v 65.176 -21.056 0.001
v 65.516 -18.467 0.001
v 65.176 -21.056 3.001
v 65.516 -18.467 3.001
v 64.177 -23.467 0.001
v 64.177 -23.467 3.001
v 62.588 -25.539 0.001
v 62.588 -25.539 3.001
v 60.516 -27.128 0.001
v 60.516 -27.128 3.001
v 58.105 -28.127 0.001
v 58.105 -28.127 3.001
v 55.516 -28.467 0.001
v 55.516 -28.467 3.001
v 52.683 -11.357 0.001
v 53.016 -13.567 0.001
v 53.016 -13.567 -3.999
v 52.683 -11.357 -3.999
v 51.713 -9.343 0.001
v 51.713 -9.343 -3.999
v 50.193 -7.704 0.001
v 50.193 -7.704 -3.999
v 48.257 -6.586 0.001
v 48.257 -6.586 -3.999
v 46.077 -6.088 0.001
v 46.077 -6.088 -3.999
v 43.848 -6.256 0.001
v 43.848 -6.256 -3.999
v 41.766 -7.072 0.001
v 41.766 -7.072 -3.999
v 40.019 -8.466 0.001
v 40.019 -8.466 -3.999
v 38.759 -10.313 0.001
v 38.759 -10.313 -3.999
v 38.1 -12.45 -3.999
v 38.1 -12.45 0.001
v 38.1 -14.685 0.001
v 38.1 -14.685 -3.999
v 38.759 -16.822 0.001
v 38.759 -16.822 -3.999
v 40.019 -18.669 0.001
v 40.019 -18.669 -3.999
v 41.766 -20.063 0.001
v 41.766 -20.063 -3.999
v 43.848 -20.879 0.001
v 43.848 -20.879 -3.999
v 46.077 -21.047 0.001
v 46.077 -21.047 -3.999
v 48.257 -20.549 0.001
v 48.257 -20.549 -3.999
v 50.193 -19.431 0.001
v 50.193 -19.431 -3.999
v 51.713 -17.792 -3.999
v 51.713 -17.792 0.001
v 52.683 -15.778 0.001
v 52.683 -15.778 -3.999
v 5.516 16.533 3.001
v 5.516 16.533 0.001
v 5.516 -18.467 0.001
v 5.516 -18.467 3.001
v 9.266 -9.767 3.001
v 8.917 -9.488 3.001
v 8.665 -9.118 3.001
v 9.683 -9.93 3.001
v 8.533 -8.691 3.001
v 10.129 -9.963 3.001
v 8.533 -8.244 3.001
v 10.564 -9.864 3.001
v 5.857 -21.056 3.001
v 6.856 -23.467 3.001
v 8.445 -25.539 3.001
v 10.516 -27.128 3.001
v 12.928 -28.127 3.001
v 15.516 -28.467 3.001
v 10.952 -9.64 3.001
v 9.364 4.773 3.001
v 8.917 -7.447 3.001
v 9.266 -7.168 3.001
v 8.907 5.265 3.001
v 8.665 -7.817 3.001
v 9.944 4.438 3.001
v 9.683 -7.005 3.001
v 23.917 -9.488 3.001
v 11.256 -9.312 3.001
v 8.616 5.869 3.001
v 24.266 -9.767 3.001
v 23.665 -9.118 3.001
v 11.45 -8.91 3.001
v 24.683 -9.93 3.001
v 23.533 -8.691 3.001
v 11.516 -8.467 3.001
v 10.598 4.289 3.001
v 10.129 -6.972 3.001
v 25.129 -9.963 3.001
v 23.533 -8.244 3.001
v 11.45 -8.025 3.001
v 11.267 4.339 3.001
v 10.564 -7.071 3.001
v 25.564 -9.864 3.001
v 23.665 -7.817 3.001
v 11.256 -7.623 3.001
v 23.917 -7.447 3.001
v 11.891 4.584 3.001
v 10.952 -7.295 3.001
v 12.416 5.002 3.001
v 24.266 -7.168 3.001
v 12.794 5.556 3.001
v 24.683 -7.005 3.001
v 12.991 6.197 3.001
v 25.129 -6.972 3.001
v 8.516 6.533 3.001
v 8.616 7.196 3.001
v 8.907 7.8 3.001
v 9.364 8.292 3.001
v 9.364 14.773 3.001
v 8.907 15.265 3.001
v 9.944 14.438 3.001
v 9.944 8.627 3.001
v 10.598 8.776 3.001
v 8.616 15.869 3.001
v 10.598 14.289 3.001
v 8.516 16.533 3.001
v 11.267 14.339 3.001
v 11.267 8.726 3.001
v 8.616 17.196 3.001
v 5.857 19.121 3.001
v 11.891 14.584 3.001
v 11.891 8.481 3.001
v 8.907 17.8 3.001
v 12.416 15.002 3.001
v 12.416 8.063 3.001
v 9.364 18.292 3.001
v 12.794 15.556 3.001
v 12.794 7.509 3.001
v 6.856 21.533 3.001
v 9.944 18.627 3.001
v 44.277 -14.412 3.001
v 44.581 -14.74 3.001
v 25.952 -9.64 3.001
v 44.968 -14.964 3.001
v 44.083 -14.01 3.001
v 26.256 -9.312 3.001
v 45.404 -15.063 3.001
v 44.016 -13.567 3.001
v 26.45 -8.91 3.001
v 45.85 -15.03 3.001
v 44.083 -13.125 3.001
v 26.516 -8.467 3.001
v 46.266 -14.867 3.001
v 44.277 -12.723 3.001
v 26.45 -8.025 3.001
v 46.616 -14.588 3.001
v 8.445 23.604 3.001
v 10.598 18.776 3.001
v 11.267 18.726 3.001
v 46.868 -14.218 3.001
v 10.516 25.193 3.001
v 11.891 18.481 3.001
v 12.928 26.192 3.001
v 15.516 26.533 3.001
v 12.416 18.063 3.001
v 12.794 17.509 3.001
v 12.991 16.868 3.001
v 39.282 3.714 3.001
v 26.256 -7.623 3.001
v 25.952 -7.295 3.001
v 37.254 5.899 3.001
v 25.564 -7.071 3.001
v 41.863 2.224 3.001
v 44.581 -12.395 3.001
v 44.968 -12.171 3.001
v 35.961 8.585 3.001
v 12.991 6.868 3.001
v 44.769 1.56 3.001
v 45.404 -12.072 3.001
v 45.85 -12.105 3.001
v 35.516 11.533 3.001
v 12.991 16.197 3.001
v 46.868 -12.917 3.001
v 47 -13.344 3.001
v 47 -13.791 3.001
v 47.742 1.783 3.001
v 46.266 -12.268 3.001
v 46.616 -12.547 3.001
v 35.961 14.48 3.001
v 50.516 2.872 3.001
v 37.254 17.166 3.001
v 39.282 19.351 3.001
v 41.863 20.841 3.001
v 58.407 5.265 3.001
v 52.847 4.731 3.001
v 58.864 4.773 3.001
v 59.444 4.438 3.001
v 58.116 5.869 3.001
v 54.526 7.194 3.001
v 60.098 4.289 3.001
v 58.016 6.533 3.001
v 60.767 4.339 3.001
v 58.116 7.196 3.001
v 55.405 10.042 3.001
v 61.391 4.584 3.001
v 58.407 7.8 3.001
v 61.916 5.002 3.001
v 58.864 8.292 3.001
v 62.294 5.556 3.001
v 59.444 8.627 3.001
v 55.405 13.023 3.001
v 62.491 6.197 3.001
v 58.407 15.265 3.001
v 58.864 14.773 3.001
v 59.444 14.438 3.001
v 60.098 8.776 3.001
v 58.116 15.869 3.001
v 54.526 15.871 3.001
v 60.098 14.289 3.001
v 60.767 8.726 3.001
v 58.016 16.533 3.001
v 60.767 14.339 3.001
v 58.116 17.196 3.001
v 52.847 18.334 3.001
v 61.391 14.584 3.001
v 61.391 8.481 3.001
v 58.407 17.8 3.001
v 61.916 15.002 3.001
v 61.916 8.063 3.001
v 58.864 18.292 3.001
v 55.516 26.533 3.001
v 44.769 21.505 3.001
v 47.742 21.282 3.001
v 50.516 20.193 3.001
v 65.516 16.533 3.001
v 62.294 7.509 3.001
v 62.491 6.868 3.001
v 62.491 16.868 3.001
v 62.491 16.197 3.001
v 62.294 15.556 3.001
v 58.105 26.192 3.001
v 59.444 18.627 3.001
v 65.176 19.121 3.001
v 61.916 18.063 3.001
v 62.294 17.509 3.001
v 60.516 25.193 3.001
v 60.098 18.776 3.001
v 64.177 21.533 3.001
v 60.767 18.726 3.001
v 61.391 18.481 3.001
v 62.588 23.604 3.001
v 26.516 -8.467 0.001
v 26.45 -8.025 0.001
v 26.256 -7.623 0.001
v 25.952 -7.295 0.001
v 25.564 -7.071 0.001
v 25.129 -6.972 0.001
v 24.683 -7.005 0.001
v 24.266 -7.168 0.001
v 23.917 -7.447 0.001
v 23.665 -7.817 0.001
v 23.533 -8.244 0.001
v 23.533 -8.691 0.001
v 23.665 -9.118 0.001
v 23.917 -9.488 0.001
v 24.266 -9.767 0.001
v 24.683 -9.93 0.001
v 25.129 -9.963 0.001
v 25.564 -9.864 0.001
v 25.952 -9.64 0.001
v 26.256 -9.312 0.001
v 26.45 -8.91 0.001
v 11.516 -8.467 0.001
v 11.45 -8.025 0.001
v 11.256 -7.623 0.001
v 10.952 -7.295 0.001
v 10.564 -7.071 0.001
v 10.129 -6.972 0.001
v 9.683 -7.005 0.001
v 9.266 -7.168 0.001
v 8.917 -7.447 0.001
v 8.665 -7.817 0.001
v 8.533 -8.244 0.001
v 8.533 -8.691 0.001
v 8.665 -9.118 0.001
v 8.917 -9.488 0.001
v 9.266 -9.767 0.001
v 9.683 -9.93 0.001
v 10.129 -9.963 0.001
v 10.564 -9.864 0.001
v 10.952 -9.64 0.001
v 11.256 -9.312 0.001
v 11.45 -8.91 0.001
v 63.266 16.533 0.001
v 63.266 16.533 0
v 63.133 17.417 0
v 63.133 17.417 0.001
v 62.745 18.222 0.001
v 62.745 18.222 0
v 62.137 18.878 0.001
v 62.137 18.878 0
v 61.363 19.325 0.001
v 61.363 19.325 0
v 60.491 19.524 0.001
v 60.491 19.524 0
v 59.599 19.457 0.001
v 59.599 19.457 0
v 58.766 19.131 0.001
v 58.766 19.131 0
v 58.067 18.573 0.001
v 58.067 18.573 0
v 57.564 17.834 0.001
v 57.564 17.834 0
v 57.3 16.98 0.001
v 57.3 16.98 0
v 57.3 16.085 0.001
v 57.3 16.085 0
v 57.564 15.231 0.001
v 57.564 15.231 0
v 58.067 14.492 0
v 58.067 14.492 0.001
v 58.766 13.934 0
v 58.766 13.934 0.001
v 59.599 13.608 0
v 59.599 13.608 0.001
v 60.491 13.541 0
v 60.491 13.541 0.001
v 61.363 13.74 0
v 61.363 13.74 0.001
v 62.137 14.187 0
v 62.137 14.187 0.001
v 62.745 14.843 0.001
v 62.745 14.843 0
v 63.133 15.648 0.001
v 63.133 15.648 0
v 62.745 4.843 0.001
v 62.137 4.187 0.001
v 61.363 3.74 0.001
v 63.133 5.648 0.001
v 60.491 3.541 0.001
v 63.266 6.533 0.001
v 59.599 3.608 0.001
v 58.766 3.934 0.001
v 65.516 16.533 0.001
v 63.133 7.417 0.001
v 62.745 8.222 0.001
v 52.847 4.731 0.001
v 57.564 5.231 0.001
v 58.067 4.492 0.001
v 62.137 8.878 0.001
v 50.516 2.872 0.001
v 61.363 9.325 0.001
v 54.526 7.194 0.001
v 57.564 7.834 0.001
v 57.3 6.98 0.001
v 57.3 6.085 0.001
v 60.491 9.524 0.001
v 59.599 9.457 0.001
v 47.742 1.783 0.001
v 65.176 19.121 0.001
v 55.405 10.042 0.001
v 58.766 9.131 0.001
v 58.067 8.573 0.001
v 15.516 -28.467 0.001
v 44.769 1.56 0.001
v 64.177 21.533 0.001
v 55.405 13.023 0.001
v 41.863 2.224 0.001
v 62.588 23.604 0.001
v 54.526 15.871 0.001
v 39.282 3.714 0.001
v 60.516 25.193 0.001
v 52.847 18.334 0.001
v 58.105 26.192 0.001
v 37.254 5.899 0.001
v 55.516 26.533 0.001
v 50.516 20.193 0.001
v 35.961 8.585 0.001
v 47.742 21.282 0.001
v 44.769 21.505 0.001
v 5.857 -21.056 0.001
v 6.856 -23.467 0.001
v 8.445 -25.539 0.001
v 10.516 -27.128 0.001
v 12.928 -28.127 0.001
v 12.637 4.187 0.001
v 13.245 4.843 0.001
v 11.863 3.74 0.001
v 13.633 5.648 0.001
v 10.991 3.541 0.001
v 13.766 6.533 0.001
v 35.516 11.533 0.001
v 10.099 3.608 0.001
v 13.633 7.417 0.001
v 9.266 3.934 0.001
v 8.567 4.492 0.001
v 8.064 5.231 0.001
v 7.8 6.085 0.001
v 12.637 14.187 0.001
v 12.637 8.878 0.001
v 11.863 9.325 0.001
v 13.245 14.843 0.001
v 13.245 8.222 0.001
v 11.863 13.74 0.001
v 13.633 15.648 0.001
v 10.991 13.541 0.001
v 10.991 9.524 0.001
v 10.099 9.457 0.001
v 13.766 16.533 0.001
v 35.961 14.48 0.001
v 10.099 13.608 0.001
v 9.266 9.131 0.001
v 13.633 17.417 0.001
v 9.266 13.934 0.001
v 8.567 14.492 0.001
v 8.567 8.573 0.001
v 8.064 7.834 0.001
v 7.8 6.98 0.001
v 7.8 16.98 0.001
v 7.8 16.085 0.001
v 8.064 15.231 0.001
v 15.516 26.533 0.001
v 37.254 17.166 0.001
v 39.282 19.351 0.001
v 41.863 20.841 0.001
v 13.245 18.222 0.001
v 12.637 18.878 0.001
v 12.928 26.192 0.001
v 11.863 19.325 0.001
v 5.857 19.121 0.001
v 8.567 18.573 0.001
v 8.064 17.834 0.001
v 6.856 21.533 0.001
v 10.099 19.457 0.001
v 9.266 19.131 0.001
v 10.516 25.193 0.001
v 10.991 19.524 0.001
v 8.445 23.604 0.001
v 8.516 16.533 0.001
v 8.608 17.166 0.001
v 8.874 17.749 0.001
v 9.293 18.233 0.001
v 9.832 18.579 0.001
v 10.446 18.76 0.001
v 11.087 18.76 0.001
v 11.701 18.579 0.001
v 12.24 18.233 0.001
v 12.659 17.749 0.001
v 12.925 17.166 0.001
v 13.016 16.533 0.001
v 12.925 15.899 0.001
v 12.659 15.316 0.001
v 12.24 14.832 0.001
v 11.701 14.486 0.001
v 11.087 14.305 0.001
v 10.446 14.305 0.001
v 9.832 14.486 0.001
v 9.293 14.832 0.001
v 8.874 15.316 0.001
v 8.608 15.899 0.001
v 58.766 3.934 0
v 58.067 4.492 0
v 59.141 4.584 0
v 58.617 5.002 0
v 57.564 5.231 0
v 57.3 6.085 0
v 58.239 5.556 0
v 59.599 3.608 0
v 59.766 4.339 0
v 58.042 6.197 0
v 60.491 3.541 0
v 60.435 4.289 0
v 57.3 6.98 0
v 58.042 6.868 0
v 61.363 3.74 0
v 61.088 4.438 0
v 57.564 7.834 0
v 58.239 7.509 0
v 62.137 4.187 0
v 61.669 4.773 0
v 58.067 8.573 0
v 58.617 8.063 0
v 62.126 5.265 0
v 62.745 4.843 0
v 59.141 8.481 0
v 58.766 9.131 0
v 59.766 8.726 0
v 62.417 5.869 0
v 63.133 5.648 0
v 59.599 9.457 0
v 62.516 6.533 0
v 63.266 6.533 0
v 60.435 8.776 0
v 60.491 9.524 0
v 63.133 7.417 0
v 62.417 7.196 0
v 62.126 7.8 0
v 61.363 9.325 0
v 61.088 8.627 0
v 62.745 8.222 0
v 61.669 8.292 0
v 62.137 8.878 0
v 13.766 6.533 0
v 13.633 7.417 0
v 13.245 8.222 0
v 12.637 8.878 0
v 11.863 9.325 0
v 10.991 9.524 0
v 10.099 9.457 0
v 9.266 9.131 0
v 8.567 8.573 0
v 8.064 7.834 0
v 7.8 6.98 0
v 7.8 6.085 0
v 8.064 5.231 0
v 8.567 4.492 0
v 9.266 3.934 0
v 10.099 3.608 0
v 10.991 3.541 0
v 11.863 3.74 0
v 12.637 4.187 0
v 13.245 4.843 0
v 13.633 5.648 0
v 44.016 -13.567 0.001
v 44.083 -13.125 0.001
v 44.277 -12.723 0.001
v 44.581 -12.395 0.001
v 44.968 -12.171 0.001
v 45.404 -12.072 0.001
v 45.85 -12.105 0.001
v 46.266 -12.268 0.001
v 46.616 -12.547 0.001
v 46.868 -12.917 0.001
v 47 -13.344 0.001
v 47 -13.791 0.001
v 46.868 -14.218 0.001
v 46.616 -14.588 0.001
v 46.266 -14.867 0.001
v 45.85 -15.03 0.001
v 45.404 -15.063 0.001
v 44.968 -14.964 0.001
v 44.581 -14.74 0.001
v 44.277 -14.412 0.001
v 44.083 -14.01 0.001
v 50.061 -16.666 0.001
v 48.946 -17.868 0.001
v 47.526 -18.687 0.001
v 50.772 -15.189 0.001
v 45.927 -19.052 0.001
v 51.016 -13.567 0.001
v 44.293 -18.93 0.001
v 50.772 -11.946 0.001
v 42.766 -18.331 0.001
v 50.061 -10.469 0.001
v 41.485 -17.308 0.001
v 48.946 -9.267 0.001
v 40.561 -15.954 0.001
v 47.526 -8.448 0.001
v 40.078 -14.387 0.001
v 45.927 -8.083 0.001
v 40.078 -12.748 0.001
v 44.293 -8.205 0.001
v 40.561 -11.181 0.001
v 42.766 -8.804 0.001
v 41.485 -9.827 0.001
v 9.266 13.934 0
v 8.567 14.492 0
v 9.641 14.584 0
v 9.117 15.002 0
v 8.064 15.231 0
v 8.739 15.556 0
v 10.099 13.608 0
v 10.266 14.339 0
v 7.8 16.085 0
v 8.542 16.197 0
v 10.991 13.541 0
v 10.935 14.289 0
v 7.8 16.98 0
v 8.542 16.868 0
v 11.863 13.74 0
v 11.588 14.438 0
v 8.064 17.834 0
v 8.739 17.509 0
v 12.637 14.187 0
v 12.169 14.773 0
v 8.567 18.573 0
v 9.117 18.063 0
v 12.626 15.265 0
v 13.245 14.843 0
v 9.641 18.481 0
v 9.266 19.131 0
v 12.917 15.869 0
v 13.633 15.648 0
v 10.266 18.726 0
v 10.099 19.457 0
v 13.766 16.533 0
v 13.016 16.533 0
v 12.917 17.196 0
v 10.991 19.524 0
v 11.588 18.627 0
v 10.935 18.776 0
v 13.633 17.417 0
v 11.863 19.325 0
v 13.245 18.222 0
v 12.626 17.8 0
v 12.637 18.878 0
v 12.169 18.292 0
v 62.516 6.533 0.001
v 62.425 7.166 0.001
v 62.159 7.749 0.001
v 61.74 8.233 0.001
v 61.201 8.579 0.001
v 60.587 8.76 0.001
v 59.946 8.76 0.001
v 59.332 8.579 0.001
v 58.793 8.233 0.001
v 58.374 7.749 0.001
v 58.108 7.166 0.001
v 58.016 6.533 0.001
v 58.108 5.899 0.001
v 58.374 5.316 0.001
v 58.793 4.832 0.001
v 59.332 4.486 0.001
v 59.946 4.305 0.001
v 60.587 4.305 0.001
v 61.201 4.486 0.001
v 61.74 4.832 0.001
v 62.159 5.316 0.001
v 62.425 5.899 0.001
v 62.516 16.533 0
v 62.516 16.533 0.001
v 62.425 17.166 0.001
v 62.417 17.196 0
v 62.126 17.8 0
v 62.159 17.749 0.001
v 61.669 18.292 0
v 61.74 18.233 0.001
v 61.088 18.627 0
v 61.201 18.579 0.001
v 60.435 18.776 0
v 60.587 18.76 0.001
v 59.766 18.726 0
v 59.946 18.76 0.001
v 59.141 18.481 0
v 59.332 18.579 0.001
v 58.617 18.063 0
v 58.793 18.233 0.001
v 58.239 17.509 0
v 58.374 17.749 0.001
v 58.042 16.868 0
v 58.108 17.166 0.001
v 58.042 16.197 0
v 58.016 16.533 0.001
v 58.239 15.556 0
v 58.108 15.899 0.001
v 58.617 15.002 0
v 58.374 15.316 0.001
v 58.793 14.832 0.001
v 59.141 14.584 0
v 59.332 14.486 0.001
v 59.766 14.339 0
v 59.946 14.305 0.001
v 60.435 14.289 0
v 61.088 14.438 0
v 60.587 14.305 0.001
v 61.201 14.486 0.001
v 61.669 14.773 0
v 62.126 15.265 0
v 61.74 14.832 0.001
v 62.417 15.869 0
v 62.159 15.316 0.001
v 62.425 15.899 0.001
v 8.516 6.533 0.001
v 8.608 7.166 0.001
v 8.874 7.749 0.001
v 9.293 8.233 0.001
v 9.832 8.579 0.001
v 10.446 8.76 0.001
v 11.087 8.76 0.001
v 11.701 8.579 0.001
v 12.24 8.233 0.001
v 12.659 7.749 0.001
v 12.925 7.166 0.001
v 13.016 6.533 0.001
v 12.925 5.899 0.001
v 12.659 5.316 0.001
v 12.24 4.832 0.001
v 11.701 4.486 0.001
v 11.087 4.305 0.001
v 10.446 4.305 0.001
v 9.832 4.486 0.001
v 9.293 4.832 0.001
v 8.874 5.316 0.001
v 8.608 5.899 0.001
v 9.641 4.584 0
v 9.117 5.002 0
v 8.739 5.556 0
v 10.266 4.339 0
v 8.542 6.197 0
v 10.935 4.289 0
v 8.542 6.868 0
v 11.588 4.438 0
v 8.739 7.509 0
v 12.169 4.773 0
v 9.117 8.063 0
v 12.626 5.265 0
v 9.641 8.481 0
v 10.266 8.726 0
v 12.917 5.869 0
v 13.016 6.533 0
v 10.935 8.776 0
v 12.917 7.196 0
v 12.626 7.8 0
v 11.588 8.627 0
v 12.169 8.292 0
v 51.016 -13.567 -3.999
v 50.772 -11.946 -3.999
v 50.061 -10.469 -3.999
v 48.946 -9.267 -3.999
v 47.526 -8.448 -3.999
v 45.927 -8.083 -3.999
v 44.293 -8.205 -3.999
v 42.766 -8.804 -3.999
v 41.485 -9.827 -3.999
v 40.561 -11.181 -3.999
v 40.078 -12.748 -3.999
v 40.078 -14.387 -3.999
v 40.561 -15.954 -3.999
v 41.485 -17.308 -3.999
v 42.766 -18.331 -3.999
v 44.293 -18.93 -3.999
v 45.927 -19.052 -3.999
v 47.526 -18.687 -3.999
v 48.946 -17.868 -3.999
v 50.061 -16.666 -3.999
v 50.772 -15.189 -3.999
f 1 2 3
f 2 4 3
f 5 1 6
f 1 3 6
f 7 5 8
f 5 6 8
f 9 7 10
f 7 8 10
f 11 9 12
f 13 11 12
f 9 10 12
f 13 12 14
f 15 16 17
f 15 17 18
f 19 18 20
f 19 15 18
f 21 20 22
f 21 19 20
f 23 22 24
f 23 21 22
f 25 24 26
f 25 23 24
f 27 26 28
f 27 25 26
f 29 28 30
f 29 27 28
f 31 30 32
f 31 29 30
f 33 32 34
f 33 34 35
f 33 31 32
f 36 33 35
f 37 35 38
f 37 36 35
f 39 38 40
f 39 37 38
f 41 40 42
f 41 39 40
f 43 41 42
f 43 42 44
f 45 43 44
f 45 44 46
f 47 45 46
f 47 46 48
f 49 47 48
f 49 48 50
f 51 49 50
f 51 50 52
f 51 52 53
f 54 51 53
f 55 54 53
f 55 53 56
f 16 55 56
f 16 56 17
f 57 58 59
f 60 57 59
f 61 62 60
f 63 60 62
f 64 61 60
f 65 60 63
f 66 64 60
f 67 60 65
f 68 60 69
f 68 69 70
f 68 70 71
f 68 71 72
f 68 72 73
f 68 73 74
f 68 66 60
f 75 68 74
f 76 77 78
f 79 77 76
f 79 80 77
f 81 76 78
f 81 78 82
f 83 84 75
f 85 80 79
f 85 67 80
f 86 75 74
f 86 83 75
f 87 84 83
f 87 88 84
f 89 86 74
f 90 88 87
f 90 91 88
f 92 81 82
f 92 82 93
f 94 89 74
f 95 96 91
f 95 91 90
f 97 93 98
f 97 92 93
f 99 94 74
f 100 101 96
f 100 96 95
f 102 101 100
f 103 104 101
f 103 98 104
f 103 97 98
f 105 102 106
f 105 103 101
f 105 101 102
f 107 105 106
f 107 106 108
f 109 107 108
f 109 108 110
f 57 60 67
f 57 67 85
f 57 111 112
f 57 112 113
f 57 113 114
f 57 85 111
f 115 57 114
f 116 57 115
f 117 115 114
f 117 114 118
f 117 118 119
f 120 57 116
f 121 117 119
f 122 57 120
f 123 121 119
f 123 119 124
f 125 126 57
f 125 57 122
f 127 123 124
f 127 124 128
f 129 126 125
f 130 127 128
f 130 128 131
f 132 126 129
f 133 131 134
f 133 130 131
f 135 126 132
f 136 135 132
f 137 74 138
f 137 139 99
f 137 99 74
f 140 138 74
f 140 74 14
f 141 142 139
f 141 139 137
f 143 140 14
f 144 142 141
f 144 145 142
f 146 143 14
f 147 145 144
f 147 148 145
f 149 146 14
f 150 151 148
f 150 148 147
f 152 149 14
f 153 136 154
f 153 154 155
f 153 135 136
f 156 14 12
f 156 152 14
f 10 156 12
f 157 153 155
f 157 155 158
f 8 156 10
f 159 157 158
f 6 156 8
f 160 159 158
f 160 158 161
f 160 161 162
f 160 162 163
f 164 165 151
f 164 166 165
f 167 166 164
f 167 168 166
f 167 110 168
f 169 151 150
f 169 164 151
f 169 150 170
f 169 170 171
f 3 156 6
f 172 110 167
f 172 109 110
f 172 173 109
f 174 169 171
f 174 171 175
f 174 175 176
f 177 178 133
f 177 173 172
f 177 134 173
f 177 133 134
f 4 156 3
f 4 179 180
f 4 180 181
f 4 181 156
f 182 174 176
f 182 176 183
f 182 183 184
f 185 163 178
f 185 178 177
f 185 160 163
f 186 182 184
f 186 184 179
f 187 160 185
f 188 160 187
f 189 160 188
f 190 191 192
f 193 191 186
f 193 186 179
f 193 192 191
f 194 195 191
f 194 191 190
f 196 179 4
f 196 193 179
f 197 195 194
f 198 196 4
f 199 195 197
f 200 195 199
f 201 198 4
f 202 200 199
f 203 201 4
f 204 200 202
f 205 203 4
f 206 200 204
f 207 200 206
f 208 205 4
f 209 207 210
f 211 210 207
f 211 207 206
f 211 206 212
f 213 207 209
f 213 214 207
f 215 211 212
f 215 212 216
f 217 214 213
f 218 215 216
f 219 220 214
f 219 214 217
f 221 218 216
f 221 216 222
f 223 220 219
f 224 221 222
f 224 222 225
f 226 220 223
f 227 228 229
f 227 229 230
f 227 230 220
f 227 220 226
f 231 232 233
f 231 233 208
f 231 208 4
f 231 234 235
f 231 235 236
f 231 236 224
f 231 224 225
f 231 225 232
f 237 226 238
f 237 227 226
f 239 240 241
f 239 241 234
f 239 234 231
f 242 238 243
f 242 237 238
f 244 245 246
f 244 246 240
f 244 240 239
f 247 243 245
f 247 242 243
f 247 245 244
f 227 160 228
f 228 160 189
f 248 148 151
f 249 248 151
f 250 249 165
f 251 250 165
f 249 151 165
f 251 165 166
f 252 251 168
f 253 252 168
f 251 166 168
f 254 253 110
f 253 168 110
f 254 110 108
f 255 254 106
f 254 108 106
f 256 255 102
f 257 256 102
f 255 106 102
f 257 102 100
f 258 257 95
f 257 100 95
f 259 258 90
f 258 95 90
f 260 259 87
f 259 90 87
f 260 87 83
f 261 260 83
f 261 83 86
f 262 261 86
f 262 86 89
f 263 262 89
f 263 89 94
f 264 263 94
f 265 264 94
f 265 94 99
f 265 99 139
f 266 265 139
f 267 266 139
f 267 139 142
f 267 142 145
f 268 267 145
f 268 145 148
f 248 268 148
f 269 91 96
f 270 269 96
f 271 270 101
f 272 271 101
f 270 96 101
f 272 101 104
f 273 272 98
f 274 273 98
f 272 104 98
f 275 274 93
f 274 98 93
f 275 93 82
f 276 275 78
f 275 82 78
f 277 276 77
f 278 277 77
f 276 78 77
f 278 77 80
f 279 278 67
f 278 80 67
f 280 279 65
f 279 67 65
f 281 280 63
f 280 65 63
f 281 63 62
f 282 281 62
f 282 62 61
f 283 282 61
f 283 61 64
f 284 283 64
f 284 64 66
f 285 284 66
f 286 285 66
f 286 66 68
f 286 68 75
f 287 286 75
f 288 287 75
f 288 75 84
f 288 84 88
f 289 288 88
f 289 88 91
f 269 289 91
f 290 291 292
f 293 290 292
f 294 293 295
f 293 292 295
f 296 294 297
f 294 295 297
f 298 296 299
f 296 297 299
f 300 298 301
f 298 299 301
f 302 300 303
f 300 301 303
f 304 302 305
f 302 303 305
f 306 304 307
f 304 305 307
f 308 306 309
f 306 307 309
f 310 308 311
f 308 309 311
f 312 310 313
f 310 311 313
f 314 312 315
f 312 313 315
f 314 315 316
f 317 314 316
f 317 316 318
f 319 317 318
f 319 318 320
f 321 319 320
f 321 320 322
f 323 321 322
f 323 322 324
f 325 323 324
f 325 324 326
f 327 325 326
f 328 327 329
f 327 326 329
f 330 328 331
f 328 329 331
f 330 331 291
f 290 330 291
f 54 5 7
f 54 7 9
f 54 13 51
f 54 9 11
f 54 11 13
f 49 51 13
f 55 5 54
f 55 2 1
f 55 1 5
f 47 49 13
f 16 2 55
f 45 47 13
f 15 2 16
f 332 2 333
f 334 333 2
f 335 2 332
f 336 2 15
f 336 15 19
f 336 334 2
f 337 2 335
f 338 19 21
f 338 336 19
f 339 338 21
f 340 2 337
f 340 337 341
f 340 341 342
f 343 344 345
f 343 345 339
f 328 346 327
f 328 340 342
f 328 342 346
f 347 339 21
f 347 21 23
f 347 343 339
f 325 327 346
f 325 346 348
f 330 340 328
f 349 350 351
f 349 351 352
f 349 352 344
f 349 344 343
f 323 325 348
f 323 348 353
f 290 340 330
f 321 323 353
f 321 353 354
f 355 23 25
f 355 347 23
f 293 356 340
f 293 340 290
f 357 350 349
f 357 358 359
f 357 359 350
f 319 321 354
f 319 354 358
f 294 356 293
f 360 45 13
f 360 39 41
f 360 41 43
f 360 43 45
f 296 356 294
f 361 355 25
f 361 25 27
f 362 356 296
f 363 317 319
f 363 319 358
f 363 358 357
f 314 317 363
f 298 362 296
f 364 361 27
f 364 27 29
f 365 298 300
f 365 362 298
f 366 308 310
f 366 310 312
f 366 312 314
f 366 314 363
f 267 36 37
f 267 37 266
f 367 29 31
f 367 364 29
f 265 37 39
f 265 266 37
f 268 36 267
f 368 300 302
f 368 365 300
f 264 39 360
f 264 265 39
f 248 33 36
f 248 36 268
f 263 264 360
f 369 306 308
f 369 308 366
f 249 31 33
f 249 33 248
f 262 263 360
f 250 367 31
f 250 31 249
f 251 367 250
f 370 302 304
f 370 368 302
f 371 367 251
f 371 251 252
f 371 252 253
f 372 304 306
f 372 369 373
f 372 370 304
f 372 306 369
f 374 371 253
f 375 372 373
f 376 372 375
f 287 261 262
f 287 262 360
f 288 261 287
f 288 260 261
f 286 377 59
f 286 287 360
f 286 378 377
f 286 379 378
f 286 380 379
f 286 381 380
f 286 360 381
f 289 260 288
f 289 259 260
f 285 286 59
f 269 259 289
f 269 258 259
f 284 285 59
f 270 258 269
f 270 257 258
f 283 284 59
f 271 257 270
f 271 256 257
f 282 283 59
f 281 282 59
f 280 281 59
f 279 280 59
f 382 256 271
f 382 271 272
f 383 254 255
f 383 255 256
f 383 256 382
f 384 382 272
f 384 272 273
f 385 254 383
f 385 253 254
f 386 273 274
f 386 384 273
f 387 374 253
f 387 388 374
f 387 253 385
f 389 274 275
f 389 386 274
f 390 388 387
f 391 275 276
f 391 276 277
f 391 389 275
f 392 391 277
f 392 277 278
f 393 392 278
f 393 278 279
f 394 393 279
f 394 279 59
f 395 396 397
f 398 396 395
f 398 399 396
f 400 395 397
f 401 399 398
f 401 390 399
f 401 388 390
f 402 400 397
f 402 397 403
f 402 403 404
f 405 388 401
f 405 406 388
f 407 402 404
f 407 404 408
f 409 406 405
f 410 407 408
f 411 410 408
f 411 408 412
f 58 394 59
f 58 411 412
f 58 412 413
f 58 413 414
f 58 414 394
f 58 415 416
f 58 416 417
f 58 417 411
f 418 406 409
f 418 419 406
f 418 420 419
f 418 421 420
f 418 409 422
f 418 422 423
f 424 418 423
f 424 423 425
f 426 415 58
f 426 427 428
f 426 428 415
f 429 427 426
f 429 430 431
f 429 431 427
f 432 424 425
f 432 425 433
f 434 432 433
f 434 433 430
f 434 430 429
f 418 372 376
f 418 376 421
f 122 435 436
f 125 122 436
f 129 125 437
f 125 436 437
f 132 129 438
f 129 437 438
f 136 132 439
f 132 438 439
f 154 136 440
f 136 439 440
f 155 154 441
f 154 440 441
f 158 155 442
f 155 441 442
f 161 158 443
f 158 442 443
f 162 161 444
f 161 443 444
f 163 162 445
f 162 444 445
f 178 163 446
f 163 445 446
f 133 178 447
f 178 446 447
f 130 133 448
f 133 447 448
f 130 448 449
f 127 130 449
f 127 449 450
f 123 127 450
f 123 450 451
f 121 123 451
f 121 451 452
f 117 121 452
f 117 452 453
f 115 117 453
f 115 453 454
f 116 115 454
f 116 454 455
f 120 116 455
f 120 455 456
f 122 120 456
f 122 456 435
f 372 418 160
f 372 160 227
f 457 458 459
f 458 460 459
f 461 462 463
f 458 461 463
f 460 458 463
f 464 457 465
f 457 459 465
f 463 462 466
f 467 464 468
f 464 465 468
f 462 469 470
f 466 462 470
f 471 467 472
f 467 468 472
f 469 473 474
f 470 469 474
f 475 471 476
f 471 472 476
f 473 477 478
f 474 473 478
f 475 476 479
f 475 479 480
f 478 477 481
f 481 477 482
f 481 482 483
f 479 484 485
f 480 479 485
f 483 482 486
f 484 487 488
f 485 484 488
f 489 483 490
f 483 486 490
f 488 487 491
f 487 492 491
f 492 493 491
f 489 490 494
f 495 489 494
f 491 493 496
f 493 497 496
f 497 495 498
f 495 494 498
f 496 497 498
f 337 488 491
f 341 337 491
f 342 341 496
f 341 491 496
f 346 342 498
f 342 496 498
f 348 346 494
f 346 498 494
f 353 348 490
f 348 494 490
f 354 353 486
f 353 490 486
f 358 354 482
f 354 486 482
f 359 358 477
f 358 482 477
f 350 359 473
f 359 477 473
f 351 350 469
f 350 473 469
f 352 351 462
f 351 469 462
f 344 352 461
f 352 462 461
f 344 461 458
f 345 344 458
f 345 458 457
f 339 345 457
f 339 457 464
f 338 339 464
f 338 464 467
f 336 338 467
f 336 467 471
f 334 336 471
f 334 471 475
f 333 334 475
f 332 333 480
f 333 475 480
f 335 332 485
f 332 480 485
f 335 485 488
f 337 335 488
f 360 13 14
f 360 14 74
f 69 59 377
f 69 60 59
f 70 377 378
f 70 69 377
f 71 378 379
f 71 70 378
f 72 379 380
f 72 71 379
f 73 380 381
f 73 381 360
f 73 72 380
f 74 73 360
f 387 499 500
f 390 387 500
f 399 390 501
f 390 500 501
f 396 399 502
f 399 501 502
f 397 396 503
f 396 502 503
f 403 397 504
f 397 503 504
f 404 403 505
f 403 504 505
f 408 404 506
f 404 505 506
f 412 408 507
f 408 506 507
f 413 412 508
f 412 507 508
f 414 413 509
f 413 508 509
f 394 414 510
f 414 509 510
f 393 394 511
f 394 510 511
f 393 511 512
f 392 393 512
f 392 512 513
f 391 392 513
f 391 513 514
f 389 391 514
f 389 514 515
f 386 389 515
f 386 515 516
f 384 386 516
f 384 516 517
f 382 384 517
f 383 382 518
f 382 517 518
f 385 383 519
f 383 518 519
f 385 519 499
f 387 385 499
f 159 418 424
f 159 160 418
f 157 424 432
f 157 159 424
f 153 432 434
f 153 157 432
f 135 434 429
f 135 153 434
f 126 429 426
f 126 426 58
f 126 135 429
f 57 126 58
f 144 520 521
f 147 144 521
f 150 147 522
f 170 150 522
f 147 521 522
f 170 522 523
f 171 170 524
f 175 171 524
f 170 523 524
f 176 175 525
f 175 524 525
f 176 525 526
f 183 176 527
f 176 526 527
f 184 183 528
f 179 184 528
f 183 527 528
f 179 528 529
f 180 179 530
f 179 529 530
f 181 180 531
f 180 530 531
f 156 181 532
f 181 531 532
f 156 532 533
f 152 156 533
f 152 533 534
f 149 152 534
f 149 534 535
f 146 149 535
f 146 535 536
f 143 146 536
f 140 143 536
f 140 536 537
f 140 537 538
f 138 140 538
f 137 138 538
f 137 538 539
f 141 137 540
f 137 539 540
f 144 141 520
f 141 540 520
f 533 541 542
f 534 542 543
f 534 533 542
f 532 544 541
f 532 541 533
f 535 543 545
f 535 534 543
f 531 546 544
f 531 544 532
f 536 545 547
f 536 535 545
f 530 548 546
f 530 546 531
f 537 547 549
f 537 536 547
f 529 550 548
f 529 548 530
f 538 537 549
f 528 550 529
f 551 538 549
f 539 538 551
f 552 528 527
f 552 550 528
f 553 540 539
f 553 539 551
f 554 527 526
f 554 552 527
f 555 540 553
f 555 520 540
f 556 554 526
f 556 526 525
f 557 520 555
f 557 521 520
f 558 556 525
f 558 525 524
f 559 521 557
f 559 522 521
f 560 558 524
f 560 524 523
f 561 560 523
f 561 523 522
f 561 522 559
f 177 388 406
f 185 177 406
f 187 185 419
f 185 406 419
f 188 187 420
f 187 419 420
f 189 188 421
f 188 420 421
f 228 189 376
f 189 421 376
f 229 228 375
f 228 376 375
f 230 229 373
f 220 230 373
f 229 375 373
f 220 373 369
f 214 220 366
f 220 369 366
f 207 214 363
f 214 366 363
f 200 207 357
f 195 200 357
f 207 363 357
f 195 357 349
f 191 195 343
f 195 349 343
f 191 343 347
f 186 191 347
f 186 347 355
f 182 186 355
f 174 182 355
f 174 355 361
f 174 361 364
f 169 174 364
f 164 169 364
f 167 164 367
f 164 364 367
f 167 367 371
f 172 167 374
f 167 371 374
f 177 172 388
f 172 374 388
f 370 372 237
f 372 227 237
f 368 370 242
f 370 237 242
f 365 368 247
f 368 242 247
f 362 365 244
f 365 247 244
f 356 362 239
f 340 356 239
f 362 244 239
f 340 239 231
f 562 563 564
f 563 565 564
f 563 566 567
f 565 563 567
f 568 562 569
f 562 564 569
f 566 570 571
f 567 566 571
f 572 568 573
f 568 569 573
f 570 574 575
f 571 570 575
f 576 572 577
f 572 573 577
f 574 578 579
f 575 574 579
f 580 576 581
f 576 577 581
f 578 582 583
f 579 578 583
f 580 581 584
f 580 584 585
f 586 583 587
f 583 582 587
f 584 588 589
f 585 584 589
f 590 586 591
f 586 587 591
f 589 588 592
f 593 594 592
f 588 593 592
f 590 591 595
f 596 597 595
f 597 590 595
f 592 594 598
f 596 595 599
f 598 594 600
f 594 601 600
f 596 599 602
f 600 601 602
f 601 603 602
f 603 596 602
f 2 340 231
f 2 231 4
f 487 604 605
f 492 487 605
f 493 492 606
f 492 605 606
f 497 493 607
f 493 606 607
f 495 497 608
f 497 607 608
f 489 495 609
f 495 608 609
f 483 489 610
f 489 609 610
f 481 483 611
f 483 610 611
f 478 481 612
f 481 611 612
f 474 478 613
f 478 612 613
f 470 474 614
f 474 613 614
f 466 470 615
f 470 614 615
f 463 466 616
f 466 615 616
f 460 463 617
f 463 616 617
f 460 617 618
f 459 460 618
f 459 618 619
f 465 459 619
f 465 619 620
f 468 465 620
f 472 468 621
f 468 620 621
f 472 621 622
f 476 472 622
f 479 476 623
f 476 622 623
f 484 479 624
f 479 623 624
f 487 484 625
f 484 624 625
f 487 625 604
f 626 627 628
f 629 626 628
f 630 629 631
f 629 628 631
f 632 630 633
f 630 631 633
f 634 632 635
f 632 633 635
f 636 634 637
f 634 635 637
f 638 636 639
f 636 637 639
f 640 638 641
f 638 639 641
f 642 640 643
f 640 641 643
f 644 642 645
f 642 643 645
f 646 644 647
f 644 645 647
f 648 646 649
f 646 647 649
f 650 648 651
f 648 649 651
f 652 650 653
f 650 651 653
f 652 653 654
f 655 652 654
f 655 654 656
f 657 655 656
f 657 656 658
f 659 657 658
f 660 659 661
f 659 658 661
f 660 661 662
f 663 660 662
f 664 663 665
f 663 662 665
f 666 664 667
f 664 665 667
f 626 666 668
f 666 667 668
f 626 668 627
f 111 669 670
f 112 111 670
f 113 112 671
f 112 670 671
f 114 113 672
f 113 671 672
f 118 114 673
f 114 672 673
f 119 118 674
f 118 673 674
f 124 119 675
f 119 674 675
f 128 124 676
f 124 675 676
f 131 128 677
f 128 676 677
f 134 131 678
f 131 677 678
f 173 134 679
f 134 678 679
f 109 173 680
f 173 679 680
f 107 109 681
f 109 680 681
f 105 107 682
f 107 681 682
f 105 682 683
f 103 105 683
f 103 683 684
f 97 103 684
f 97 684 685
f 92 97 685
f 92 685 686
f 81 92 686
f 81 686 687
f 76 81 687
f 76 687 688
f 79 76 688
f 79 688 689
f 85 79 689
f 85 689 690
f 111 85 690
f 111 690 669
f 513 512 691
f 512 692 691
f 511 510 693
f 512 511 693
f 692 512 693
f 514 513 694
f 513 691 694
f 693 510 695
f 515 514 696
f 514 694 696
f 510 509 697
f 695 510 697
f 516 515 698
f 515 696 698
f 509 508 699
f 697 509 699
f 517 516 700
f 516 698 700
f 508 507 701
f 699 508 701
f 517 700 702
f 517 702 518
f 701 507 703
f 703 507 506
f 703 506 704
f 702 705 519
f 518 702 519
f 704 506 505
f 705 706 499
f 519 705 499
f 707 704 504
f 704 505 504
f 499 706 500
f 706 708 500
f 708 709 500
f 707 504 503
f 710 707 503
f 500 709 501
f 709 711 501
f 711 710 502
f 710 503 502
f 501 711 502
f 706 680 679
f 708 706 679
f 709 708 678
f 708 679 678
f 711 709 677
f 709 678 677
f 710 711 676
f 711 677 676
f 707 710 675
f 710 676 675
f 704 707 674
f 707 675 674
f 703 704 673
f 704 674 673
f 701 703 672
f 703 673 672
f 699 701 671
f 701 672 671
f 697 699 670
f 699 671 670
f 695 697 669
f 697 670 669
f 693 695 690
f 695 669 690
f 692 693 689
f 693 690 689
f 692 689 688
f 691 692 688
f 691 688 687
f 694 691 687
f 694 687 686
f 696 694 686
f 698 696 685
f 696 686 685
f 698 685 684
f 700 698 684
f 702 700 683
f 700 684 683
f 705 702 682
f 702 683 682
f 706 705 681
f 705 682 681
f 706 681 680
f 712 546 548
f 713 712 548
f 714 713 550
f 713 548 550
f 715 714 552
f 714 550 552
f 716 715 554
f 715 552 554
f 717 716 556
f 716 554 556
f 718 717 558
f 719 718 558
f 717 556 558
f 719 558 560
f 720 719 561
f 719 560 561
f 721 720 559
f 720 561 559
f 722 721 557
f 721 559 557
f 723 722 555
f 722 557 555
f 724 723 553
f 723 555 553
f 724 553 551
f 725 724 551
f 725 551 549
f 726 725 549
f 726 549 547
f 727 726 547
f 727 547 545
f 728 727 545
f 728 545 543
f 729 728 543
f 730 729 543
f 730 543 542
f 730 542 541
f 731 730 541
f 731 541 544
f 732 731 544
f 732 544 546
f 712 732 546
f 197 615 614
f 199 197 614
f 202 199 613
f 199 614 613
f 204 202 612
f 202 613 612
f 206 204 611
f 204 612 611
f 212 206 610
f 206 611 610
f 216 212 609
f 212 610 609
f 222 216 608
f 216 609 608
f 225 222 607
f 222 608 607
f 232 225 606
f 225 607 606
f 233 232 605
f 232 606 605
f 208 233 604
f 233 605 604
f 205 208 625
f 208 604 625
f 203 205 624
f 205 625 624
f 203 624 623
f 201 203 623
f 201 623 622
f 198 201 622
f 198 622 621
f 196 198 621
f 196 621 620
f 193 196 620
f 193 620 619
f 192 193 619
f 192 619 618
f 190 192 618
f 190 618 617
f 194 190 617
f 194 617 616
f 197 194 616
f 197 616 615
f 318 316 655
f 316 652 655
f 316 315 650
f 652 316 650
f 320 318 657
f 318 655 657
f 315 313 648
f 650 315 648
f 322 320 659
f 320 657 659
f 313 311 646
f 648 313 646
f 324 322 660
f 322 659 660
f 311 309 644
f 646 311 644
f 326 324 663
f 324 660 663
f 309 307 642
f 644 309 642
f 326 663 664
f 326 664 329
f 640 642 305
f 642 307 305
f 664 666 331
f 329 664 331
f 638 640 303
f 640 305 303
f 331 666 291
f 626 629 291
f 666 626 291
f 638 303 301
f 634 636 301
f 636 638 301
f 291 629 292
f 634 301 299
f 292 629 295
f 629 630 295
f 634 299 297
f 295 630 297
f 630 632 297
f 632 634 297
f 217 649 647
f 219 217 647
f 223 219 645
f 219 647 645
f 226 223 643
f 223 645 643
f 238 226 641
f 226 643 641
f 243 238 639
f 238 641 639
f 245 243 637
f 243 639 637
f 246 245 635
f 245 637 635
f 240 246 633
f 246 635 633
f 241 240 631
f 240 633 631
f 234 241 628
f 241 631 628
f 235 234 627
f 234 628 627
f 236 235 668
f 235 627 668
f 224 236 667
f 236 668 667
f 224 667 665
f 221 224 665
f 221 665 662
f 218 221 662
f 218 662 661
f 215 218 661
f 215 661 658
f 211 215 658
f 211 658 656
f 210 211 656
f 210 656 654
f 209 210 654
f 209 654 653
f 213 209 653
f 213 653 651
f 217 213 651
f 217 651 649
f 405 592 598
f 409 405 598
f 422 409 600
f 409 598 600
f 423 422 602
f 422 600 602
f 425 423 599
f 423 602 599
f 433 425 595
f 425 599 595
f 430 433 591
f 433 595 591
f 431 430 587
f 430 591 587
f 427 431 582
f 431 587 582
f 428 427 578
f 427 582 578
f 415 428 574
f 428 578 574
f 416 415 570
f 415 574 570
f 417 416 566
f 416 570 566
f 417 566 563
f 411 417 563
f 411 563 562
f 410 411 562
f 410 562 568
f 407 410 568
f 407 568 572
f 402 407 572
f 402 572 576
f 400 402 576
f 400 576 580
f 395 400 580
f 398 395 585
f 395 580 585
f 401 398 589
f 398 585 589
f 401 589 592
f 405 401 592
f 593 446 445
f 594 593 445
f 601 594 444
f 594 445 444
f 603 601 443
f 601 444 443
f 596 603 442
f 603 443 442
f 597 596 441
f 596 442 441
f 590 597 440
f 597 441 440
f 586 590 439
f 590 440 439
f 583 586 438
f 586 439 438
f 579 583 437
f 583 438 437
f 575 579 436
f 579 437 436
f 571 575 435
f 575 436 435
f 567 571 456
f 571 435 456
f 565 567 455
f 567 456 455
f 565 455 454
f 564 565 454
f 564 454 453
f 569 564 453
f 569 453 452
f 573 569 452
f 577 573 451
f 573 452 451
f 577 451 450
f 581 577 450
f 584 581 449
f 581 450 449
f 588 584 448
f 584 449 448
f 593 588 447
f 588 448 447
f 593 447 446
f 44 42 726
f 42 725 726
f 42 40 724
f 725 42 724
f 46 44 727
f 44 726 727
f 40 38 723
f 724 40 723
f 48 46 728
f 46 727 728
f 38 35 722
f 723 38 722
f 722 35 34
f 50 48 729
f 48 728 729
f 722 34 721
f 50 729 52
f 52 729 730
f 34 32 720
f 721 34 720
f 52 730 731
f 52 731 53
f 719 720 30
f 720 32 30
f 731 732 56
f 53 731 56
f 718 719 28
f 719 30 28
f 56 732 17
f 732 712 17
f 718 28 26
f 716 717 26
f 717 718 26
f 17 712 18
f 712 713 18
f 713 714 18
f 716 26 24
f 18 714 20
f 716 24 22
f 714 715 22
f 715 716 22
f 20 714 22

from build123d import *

# Parameters (mm, degrees)
SKETCH_3_R               = 3
EXTRUDE_6_DEPTH          = 0.001
EXTRUDE_6_2_DEPTH        = 0.001
EXTRUDE_6_3_DEPTH        = 0.001
EXTRUDE_6_4_DEPTH        = 0.001
SKETCH_11_R              = 2.25
CUT_EXTRUDE_2_DEPTH      = 1
CUT_EXTRUDE_2_DEPTH_BACK = 1.001
EXTRUDE_7_DEPTH          = 3
SKETCH_14_R              = 2.25
SKETCH_14_R_2            = 10
CUT_EXTRUDE_3_DEPTH      = 3
SKETCH_15_R              = 10
SKETCH_15_R_2            = 1.5
CUT_EXTRUDE_4_DEPTH      = 3
SKETCH_16_R              = 1.5
CUT_EXTRUDE_5_DEPTH      = 10
SKETCH_17_R              = 7.5
SKETCH_17_R_2            = 5.5
EXTRUDE_8_DEPTH          = 7
FILLET_1_R               = 10


with BuildPart() as part:
    # 草图3 → 凸台-拉伸6 (new body)
    with BuildSketch(Plane.XY):
        with Locations((60.266478541, 16.532501821)):
            Circle(SKETCH_3_R)
    extrude(amount=EXTRUDE_6_DEPTH)


with BuildPart() as body_2:
    # 草图3 → Extrude 6 2 (new body)
    with BuildSketch(Plane.XY):
        with Locations((60.266478541, 6.532501821)):
            Circle(SKETCH_3_R)
    extrude(amount=EXTRUDE_6_2_DEPTH)


with BuildPart() as body_3:
    # 草图3 → Extrude 6 3 (new body)
    with BuildSketch(Plane.XY):
        with Locations((10.766478541, 6.532501821)):
            Circle(SKETCH_3_R)
    extrude(amount=EXTRUDE_6_3_DEPTH)


with BuildPart() as body_4:
    # 草图3 → Extrude 6 4 (new body)
    with BuildSketch(Plane.XY):
        with Locations((10.766478541, 16.532501821)):
            Circle(SKETCH_3_R)
    extrude(amount=EXTRUDE_6_4_DEPTH)


with BuildPart() as cut_extrude_2_tool:
    # 草图11 → 切除-拉伸2 (new body, two sides)
    with BuildSketch(Plane.XY.offset(0.001)) as cut_extrude_2_sk:
        with Locations((10.766478541, 16.532501821)):
            Circle(SKETCH_11_R)
        with Locations((10.766478541, 6.532501821)):
            Circle(SKETCH_11_R)
        with Locations((60.266478541, 16.532501821)):
            Circle(SKETCH_11_R)
        with Locations((60.266478541, 6.532501821)):
            Circle(SKETCH_11_R)
    extrude(amount=CUT_EXTRUDE_2_DEPTH)
    extrude(cut_extrude_2_sk.sketch, amount=-CUT_EXTRUDE_2_DEPTH_BACK)


with BuildPart() as part_1:
    add(part.part)

    # 切除-拉伸2: cut by cut_extrude_2_tool
    add(cut_extrude_2_tool.part, mode=Mode.SUBTRACT)



with BuildPart() as body_2_1:
    add(body_2.part)

    # 切除-拉伸2: cut by cut_extrude_2_tool
    add(cut_extrude_2_tool.part, mode=Mode.SUBTRACT)


with BuildPart() as body_3_1:
    add(body_3.part)

    # 切除-拉伸2: cut by cut_extrude_2_tool
    add(cut_extrude_2_tool.part, mode=Mode.SUBTRACT)


with BuildPart() as body_4_1:
    add(body_4.part)

    # 切除-拉伸2: cut by cut_extrude_2_tool
    add(cut_extrude_2_tool.part, mode=Mode.SUBTRACT)


with BuildPart() as part_2:
    add(part_1.part)

    add(body_2_1.part)  # 凸台-拉伸7 merges body 2

    add(body_3_1.part)  # 凸台-拉伸7 merges body 3

    add(body_4_1.part)  # 凸台-拉伸7 merges body 4
    # 草图12 → 凸台-拉伸7 (add)
    with BuildSketch(Plane.XY.offset(0.001)):
        Polygon((5.516478541, 26.532501821), (65.516478541, 26.532501821), (65.516478541, -28.467498179), (5.516478541, -28.467498179), (5.516478541, 1.532501821), align=None)
    extrude(amount=EXTRUDE_7_DEPTH)

    # 草图14 → 切除-拉伸3 (cut)
    with BuildSketch(Plane(origin=(0, 0, 0.001), x_dir=(-1, 0, 0), z_dir=(0, 0, -1))):
        with Locations((-60.266478541, 6.532501821)):
            Circle(SKETCH_14_R)
        with Locations((-60.266478541, 16.532501821)):
            Circle(SKETCH_14_R)
        with Locations((-10.766478541, 6.532501821)):
            Circle(SKETCH_14_R)
        with Locations((-10.766478541, 16.532501821)):
            Circle(SKETCH_14_R)
        with Locations((-45.516478541, 11.532501821)):
            Circle(SKETCH_14_R_2)
    extrude(amount=-CUT_EXTRUDE_3_DEPTH, mode=Mode.SUBTRACT)

    # 草图15 → 切除-拉伸4 (cut)
    with BuildSketch(Plane(origin=(0, 0, 0.001), x_dir=(-1, 0, 0), z_dir=(0, 0, -1))):
        with Locations((-45.516478541, 11.532501821)):
            Circle(SKETCH_15_R)
        with Locations((-45.516478541, -13.567498179)):
            Circle(SKETCH_15_R_2)
    extrude(amount=-CUT_EXTRUDE_4_DEPTH, mode=Mode.SUBTRACT)

    # 草图16 → 切除-拉伸5 (cut)
    with BuildSketch(Plane.XY.offset(3.001)):
        with Locations((10.016478541, -8.467498179)):
            Circle(SKETCH_16_R)
        with Locations((25.016478541, -8.467498179)):
            Circle(SKETCH_16_R)
    extrude(amount=-CUT_EXTRUDE_5_DEPTH, mode=Mode.SUBTRACT)

    # 草图17 → 凸台-拉伸8 (add)
    with BuildSketch(Plane.XY.offset(3.001)):
        with Locations((45.516478541, -13.567498179)):
            Circle(SKETCH_17_R)
        with Locations((45.516478541, -13.567498179)):
            Circle(SKETCH_17_R_2, mode=Mode.SUBTRACT)
    extrude(amount=-EXTRUDE_8_DEPTH)

    # 圆角1
    fillet_1_edges = [part_2.edges().sort_by_distance(p)[0] for p in [
        (5.516478541, 26.532501821, 1.501),
        (5.516478541, -28.467498179, 1.501),
        (65.516478541, -28.467498179, 1.501),
        (65.516478541, 26.532501821, 1.501),
    ]]
    fillet(fillet_1_edges, radius=FILLET_1_R)


solid = part_2.part
